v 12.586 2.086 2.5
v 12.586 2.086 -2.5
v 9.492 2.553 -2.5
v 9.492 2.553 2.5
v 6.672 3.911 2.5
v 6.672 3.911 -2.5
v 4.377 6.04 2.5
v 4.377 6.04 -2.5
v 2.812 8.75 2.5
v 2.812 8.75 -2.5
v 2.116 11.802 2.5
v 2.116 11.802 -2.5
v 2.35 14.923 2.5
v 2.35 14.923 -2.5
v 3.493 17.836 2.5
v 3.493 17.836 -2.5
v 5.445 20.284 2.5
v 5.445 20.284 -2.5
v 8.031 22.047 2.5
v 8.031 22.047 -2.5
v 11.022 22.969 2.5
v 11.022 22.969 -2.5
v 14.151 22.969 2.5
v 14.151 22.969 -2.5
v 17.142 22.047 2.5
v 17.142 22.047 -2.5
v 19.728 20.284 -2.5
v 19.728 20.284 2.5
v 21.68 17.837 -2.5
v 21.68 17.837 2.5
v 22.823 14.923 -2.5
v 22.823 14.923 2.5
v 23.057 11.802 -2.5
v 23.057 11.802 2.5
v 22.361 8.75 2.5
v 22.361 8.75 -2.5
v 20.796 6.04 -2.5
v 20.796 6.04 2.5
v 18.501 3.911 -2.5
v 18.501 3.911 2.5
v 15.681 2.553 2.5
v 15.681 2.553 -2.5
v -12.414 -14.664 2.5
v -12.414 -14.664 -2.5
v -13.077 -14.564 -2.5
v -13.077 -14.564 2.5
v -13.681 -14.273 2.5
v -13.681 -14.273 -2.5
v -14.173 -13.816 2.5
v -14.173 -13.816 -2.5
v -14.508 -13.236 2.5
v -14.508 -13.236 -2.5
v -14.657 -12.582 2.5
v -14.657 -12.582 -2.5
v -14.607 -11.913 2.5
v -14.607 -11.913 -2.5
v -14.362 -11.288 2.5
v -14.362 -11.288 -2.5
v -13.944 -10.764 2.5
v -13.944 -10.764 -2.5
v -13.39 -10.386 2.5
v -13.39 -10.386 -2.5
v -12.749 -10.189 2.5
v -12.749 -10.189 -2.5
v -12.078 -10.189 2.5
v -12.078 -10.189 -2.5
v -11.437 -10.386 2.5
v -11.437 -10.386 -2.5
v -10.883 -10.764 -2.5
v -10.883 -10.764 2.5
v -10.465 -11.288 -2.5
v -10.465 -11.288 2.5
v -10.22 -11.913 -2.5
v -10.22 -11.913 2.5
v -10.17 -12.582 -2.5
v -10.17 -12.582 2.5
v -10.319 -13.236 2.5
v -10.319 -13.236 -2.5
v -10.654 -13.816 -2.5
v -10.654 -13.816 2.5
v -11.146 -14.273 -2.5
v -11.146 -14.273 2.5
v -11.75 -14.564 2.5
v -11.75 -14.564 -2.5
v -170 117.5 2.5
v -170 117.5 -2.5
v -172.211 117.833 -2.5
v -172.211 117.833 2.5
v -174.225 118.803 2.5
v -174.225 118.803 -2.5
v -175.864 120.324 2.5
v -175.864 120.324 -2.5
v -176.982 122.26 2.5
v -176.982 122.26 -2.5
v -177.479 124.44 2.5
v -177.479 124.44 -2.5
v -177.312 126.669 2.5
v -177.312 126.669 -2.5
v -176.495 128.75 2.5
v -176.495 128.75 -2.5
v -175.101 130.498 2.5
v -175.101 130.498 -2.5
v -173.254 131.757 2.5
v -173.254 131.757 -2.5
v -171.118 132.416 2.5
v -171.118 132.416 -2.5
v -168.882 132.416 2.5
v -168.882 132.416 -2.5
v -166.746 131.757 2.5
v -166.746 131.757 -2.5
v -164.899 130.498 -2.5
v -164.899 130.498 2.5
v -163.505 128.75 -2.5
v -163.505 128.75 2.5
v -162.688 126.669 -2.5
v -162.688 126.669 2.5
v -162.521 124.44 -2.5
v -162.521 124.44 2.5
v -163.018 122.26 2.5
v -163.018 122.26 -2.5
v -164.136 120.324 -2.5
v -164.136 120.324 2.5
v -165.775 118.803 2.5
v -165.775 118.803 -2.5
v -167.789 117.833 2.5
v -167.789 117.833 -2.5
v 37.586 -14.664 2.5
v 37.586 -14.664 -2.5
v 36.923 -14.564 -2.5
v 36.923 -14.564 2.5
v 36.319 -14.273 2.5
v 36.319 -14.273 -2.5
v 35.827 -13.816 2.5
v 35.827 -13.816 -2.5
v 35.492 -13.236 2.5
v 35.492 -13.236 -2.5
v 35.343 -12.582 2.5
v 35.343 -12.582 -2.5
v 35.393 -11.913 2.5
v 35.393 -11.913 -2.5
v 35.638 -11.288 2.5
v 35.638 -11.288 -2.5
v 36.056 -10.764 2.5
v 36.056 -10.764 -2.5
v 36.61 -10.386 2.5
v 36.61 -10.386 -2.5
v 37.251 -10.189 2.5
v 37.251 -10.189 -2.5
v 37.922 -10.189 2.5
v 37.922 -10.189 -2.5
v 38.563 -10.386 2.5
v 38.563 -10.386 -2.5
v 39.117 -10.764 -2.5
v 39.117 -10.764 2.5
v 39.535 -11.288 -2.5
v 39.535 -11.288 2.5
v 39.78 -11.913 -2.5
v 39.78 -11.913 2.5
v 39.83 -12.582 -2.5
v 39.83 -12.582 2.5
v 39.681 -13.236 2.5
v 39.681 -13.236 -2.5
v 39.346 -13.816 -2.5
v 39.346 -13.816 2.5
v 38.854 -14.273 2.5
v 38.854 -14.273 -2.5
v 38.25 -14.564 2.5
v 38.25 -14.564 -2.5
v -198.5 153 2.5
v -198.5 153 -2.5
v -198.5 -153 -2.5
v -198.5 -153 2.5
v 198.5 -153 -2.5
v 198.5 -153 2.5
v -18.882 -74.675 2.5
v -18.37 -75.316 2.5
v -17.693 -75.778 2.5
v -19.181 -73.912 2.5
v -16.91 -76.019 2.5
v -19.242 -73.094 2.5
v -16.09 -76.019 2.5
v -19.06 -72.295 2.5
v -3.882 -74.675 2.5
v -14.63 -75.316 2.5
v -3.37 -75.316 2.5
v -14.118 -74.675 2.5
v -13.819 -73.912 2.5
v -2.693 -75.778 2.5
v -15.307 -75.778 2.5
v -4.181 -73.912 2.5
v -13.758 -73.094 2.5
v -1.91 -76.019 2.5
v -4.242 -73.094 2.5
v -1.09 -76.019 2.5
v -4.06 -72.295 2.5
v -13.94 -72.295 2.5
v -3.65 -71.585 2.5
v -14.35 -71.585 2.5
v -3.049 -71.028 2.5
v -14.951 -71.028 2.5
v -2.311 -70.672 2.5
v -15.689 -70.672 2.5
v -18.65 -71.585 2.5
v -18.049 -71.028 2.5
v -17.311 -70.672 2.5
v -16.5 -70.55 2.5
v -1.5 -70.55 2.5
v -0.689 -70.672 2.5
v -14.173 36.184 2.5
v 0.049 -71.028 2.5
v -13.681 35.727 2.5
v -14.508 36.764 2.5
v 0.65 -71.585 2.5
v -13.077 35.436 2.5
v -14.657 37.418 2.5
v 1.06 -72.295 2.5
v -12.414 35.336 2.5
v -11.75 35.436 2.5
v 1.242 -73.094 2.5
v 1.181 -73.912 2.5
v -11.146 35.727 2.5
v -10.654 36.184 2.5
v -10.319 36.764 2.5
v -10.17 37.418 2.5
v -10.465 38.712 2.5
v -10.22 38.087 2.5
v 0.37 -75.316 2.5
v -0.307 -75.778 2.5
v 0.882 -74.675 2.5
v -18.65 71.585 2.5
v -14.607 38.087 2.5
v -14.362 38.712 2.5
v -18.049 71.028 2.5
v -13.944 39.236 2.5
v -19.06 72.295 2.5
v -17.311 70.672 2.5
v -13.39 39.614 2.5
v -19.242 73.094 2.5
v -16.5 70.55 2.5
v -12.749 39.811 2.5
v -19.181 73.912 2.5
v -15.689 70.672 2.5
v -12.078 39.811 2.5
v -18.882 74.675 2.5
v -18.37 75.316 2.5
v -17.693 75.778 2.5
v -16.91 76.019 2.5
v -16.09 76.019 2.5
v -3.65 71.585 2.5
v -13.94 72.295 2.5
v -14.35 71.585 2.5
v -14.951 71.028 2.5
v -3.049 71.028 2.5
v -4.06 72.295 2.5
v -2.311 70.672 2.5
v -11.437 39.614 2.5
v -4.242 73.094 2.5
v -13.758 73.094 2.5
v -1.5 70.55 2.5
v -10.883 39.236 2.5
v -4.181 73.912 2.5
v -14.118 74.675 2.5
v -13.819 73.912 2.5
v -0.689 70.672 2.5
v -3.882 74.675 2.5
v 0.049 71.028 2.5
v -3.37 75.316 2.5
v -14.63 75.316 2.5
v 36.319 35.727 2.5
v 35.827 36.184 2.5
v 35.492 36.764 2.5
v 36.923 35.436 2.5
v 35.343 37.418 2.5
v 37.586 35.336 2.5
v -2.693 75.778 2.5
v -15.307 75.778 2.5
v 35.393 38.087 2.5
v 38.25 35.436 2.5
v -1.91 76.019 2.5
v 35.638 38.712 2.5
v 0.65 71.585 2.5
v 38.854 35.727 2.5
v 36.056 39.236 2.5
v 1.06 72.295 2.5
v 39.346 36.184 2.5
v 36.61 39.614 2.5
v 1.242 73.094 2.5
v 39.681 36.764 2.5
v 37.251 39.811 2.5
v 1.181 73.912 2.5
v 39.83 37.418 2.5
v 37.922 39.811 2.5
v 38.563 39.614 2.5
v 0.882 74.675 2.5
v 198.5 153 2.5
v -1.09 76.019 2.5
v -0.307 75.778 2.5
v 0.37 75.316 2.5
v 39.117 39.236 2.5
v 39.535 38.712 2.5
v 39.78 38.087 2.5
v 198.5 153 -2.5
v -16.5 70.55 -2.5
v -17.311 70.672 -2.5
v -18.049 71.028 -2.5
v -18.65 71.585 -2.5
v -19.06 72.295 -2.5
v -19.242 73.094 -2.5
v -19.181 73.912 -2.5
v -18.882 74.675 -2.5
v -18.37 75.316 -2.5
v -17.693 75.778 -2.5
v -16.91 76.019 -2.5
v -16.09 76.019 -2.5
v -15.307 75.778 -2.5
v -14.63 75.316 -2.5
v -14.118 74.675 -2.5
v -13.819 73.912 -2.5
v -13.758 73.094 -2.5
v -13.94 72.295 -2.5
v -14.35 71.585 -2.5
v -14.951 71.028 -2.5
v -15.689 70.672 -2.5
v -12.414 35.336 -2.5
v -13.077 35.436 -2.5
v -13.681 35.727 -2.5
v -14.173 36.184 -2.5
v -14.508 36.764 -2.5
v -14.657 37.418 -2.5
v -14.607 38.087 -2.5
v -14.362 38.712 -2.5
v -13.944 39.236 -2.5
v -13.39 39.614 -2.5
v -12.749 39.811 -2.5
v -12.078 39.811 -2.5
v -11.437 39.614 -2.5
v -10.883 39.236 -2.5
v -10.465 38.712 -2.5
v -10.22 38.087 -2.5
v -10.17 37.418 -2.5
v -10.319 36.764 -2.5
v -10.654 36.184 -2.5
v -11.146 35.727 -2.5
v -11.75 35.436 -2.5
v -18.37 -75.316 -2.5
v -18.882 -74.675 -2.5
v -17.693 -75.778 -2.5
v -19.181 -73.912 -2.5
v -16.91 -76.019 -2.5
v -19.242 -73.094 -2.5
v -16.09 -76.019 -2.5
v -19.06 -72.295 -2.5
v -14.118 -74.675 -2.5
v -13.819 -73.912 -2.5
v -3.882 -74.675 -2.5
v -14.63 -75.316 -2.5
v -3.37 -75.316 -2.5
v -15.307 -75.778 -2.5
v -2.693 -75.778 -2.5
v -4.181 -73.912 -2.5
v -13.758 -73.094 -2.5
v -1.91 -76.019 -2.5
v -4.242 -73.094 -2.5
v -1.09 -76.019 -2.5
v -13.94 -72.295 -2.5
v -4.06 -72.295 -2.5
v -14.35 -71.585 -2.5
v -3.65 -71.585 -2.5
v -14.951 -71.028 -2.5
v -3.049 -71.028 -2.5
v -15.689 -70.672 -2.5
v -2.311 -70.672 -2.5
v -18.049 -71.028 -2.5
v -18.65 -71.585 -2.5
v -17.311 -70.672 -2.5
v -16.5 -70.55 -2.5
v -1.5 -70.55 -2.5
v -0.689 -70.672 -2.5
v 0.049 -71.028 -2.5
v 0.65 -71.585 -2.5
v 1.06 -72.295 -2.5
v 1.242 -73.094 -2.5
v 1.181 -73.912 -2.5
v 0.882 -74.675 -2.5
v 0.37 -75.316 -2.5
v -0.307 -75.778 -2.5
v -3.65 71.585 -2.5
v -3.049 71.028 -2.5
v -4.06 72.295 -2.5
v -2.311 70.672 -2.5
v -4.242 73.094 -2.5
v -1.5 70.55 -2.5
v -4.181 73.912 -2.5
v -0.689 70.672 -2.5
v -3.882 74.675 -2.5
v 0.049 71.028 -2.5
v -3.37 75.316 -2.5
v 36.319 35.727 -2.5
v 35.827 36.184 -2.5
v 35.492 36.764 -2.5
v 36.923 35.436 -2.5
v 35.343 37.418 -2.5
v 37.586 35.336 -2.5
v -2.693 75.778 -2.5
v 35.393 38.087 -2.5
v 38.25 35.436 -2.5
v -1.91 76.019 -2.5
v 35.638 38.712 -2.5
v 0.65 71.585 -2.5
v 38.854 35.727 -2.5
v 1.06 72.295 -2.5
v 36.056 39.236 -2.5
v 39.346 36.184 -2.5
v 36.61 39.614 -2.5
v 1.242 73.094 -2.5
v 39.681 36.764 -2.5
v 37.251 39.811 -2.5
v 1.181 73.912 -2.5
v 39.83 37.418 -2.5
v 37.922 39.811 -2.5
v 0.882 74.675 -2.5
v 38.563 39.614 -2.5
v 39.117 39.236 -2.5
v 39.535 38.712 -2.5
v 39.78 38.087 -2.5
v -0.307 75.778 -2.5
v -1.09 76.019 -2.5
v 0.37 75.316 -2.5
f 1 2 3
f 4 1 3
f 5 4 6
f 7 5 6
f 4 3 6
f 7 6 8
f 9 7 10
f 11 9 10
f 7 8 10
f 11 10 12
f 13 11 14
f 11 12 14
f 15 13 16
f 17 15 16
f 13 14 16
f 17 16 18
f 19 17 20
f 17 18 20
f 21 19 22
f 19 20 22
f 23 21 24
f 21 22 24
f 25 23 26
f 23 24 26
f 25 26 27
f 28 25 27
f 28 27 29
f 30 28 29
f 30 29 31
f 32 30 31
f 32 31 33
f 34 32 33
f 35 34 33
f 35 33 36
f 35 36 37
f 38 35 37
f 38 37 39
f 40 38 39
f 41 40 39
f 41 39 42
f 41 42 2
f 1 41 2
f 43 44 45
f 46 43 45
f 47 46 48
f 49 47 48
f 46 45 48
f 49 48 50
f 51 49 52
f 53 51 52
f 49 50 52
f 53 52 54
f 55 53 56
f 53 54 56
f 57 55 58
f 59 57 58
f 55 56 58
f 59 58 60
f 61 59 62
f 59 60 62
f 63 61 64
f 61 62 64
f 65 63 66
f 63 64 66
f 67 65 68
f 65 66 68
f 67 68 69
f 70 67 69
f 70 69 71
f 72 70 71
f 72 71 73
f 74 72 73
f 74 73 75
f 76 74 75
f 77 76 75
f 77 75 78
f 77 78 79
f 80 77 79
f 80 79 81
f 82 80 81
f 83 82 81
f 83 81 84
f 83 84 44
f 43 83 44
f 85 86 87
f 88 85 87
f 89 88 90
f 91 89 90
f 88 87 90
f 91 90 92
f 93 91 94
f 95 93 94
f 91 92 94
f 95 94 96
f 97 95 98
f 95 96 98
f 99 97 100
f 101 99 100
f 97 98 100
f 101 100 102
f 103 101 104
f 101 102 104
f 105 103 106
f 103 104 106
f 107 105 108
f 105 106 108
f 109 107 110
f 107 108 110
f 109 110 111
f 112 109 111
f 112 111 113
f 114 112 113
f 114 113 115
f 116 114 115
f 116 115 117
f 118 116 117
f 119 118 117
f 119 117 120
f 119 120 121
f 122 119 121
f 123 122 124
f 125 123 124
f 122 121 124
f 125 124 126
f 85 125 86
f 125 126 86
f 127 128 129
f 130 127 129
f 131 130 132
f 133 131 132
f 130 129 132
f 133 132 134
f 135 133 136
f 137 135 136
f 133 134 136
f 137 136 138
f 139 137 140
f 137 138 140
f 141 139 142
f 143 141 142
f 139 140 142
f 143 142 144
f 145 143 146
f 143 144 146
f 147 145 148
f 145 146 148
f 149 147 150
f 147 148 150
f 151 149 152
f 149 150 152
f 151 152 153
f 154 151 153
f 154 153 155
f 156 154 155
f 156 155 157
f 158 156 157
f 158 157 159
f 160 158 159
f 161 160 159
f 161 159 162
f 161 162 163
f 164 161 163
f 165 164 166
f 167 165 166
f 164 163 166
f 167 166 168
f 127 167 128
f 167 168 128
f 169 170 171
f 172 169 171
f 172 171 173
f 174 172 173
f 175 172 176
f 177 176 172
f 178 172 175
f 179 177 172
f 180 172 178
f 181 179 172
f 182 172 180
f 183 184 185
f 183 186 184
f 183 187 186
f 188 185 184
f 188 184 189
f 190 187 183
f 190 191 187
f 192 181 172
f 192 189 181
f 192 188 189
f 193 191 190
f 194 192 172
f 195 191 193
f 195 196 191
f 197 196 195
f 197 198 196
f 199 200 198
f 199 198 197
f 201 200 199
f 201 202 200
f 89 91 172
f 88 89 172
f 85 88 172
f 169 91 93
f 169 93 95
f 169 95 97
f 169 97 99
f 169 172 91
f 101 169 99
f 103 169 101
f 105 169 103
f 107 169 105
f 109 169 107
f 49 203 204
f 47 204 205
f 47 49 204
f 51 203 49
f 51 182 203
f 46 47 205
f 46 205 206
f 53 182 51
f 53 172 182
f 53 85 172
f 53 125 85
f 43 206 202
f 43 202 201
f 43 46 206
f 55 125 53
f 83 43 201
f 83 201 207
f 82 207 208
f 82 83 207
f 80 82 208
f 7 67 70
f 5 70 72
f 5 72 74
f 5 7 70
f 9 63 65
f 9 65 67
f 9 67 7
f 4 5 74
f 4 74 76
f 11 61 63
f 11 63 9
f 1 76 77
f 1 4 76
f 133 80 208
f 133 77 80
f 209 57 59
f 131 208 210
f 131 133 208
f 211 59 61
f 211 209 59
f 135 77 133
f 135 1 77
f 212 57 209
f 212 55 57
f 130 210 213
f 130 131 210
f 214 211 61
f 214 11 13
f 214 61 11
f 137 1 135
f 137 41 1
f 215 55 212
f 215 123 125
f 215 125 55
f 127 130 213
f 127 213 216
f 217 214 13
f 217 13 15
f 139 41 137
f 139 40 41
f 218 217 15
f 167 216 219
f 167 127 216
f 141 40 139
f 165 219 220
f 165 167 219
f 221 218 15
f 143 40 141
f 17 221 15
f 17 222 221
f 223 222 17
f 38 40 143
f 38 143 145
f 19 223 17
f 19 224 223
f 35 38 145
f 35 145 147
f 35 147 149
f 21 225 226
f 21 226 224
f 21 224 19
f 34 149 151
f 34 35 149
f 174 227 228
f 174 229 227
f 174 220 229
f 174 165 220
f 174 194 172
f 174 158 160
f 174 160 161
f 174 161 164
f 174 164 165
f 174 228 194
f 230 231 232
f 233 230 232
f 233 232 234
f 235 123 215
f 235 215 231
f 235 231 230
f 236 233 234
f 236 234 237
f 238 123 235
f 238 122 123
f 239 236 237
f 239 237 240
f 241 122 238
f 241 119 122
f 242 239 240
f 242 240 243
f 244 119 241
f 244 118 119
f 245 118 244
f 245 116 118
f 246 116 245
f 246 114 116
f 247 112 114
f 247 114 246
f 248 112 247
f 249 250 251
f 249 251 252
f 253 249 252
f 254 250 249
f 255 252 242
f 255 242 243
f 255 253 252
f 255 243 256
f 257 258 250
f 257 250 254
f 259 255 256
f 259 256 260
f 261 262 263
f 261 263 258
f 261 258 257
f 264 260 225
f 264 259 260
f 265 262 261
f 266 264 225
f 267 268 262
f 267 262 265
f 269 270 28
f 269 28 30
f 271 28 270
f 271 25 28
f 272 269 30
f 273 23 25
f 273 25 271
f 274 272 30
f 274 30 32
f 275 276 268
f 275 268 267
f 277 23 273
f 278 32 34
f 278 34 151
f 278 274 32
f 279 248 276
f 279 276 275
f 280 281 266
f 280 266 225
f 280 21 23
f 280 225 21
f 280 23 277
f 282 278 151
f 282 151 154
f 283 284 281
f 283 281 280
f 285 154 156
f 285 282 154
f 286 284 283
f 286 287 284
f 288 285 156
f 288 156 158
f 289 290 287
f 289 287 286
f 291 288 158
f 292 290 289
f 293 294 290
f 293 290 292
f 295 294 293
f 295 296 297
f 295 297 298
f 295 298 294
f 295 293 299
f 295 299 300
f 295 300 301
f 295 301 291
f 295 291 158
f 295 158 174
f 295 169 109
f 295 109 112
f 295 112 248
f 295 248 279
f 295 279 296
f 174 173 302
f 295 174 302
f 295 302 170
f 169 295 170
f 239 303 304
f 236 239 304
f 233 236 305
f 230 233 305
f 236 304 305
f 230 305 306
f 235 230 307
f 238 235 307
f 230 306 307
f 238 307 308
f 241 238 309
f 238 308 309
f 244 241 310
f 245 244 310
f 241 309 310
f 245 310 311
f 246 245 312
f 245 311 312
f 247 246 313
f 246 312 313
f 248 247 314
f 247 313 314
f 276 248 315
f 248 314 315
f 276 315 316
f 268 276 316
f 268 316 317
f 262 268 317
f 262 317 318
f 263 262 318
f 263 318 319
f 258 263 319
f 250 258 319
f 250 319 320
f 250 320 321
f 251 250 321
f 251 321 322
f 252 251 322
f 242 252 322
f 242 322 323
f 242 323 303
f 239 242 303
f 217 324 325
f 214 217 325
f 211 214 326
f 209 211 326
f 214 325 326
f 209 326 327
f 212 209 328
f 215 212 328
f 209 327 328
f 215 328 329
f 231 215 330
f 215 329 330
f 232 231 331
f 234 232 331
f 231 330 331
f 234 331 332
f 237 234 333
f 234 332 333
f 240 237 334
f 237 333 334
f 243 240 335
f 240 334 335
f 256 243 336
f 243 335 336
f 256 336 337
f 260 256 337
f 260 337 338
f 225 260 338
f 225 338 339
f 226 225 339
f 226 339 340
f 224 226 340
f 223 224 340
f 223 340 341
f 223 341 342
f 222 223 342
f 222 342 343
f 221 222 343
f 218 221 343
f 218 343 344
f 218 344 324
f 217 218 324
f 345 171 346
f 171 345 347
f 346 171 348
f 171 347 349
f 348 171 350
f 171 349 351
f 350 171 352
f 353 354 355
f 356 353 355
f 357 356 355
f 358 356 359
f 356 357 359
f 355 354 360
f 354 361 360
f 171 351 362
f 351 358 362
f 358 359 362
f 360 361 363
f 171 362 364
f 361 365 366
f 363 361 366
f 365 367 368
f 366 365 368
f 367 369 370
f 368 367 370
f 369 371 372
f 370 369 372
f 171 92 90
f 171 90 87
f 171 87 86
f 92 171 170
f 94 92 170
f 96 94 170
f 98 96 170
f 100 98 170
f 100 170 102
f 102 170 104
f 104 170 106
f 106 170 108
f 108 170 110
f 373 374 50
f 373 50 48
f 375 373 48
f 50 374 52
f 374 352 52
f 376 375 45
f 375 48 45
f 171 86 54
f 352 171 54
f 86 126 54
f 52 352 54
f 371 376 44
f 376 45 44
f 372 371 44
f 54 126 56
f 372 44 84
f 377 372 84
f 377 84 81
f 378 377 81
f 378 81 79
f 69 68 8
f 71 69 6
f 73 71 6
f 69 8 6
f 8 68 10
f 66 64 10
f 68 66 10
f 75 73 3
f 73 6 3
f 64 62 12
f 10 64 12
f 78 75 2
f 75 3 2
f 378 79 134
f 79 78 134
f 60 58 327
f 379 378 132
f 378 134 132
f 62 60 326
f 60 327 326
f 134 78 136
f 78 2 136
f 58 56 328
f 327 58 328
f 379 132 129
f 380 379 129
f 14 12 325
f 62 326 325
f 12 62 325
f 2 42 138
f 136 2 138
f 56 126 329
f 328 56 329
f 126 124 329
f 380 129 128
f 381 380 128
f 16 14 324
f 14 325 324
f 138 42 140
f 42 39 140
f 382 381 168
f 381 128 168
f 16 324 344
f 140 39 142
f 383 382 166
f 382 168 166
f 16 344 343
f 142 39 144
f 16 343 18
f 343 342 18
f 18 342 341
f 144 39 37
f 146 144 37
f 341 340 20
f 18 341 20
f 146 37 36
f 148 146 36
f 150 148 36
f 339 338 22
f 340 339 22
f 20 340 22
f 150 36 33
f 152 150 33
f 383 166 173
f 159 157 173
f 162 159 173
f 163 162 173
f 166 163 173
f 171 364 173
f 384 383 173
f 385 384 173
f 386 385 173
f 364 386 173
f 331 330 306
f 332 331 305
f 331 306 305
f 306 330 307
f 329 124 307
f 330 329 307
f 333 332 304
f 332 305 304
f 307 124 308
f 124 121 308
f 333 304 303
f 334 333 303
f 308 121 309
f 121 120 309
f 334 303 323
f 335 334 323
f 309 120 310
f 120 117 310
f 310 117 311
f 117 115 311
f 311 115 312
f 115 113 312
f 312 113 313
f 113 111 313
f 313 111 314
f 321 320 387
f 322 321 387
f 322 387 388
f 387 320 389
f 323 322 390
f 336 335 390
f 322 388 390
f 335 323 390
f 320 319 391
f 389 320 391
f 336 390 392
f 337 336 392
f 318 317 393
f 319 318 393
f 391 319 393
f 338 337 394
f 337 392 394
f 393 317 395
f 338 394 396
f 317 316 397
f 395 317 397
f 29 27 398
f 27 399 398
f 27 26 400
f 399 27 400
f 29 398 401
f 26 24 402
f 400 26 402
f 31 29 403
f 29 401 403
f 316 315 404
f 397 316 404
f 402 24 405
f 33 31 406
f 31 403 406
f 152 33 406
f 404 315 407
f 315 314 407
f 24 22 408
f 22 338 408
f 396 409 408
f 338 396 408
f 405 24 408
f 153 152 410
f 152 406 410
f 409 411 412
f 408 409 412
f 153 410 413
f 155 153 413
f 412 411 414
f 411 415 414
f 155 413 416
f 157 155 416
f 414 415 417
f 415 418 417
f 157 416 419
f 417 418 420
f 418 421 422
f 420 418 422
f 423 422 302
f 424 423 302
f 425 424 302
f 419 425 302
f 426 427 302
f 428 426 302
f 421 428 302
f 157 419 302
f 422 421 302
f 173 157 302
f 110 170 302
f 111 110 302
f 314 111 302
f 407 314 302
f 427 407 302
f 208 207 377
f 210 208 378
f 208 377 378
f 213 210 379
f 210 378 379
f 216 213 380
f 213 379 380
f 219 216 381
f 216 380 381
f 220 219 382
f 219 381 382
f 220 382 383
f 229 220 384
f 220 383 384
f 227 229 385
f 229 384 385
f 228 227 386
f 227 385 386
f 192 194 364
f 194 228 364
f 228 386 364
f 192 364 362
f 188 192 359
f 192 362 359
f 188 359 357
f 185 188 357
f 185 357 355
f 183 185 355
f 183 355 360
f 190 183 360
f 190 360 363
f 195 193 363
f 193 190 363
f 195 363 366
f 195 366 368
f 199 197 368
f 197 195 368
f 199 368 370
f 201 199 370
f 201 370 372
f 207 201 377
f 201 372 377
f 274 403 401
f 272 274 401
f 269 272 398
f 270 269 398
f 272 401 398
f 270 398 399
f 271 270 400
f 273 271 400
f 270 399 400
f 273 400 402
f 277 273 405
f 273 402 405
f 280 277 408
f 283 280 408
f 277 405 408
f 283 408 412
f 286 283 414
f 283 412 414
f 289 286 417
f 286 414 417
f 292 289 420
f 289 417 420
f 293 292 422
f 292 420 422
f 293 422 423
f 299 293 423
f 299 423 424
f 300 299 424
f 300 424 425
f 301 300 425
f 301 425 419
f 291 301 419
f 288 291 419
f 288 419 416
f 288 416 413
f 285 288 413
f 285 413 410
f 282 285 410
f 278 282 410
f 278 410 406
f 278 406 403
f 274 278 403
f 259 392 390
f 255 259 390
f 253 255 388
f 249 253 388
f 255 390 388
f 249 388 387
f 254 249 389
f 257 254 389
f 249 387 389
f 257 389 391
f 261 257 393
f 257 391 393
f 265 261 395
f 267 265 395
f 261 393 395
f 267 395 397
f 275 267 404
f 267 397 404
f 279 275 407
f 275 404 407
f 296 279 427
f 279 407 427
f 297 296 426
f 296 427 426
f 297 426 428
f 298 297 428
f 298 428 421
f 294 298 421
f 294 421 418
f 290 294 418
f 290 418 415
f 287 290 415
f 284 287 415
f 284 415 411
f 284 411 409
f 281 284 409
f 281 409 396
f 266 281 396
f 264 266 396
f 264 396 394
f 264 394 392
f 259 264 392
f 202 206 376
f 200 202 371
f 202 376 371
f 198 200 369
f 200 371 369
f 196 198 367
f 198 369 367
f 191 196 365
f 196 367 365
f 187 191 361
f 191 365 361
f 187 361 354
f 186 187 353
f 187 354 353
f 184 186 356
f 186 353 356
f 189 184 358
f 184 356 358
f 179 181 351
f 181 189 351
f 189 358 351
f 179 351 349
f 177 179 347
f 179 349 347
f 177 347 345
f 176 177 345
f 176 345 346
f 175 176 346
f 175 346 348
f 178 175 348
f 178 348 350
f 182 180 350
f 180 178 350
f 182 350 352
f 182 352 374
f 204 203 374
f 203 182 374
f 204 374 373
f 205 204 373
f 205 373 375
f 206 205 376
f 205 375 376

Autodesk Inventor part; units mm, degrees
ref_plane "YZ Plane" through (0, 0, 0) normal (1, 0, 0) x (0, 1, 0)
ref_plane "XZ Plane" through (0, 0, 0) normal (0, 1, 0) x (-1, 0, 0)
ref_plane "XY Plane" through (0, 0, 0) normal (0, 0, 1) x (1, 0, 0)
sketch "Esquisse1" plane through (0, 0, 0) normal (0, 0, 1) x (1, 0, 0)
  line L0 (-198.5, -153) -> (198.5, -153)
  line L1 (198.5, -153) -> (198.5, 153)
  line L2 (198.5, 153) -> (-198.5, 153)
  line L3 (-198.5, 153) -> (-198.5, -153)
  line L4 (-198.5, -153) -> (198.5, 153) construction
  line L5 (198.5, -153) -> (-198.5, 153) construction
  point P0 (0, 0)
  dimension "Largueur_plaque_support" = 397
  dimension "Profondeur_plaque_support" = 306
extrude "Embase" add sketch "Esquisse1" along normal mid plane 5
sketch "Trous moteur" plane through (0, 0, 2.5) normal (0, 0, 1) x (1, 0, 0)
  line L0 (-12.4135, -12.4135) -> (37.5865, 37.5865) construction
  line L1 (-12.4135, 37.5865) -> (37.5865, -12.4135) construction
  point P0 (0, 0)
  point P1 (12.5865, 12.5865)
  dimension "Entraxe_vis_moteur" = 50
  dimension "d5" = 50
  dimension "Entraxe_engrenage" = 17.8
hole "Passage vis moteur" at (-12.4135, 37.5865, 2.5) at (37.5865, 37.5865, 2.5) at (37.5865, -12.4135, 2.5) at (-12.4135, -12.4135, 2.5) direction (0, 0, -1) diameter 4.5 end through all clearance for "Vis à tête plate fraisée ISO 2009/7046" size "M4" standard "ISO"
hole "Passage axe moteur" at (12.5865, 12.5865, 2.5) direction (0, 0, -1) diameter 21 end through all
sketch "Esquisse3" plane through (0, 0, 2.5) normal (0, 0, 1) x (1, 0, 0)
  point P0 (0, 0)
  point P1 (-16.5, 73.3)
  point P2 (-1.5, 73.3)
  dimension "Entraxe_fication" = 15
  dimension "Demi_entraxe" = 73.3
  dimension "Décalage" = 1.5
hole "Passage vis bras" at (-16.5, 73.3, 2.5) at (-1.5, 73.3, 2.5) direction (0, 0, -1) diameter 5.5 end through all clearance for "Vis à tête plate fraisée ISO 2009/7046" size "M5" standard "ISO"
mirror "Symétrie passage vis bras" about plane through (0, 0, 0) normal (0, 1, 0) of "Passage vis bras"
sketch "Esquisse4" plane through (0, 0, 2.5) normal (0, 0, 1) x (1, 0, 0)
  point P0 (0, 0)
  point P1 (-170, 125)
  dimension "d31" = 170
  dimension "d32" = 125
hole "Perçage4" at (-170, 125, 2.5) direction (0, 0, -1) diameter 15 end through all
equation "\"d5\" = Entraxe_vis_moteur"
properties part number "Plaque support" material "Plastique PMMA"
